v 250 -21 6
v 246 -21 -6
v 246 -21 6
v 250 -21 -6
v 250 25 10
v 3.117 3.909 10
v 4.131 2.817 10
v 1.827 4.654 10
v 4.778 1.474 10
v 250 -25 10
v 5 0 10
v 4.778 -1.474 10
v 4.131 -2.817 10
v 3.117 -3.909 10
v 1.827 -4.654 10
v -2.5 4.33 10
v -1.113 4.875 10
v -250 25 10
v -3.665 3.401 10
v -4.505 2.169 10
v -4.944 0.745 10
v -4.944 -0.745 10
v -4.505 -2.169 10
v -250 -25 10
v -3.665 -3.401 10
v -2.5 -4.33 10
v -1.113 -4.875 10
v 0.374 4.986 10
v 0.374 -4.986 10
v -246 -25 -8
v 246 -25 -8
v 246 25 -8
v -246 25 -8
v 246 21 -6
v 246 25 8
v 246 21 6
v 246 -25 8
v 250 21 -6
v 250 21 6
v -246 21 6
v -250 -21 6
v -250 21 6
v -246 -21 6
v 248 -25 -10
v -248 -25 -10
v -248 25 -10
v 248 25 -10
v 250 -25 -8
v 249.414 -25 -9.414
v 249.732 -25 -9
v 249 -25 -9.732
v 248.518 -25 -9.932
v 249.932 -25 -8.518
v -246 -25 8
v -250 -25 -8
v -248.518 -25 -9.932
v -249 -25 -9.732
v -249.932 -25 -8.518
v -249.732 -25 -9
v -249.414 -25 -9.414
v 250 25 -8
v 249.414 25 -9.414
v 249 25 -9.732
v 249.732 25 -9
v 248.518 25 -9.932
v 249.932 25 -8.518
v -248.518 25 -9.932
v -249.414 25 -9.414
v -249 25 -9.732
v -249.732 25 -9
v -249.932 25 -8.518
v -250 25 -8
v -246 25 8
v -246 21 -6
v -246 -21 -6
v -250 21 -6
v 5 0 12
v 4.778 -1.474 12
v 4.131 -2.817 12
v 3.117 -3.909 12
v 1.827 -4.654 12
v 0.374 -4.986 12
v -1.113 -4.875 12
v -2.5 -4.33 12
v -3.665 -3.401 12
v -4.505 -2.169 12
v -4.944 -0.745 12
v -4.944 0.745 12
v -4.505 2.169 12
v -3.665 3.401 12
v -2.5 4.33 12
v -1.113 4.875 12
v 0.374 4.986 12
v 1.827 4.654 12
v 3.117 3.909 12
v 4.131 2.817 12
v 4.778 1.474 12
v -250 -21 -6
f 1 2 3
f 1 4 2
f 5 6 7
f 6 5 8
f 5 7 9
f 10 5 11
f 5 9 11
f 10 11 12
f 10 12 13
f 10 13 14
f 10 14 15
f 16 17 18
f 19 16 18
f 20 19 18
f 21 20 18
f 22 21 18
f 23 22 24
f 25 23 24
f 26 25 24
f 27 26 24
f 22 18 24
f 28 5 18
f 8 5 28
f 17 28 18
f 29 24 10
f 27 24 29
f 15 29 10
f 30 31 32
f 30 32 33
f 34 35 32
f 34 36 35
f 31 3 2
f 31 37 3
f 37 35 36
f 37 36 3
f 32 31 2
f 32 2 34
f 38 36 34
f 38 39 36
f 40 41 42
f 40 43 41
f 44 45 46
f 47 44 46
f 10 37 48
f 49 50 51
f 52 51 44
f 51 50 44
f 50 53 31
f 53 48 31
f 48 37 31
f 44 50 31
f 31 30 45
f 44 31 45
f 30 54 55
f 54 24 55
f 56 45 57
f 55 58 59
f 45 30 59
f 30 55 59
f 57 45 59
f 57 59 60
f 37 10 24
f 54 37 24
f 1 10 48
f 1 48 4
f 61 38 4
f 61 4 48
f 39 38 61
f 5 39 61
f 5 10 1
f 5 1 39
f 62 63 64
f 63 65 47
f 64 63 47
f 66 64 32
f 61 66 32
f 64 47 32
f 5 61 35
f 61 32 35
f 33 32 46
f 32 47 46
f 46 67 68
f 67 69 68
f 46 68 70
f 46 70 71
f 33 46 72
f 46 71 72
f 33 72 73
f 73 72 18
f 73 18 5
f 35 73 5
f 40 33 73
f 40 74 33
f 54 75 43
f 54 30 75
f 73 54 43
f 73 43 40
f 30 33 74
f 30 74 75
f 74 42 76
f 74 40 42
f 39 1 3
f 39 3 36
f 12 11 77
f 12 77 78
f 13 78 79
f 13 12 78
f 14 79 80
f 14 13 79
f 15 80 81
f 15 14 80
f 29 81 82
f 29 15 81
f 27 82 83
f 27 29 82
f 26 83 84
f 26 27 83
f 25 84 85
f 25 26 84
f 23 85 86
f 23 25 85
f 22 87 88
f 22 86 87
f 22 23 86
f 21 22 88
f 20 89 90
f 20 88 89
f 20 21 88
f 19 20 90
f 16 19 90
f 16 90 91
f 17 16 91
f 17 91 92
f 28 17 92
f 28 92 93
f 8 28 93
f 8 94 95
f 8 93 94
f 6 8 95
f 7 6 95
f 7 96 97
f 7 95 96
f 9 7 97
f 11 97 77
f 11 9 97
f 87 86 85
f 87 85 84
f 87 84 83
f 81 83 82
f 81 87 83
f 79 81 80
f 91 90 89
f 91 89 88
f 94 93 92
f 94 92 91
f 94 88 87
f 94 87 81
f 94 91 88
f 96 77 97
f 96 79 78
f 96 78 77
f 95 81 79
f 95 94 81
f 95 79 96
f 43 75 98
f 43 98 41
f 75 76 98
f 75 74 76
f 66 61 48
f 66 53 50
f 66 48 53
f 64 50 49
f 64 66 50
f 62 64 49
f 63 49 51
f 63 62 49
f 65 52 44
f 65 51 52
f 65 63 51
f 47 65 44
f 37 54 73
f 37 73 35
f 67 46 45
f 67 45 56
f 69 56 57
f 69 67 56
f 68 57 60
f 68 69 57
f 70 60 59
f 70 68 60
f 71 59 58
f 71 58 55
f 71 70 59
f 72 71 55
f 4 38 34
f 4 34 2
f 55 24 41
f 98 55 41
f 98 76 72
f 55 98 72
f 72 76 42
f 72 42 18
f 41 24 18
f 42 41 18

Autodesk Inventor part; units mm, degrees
ref_plane "YZ Plane" through (0, 0, 0) normal (1, 0, 0) x (0, 1, 0)
ref_plane "XZ Plane" through (0, 0, 0) normal (0, 1, 0) x (-1, 0, 0)
ref_plane "XY Plane" through (0, 0, 0) normal (0, 0, 1) x (1, 0, 0)
sketch "スケッチ2" plane through (0, 0, 0) normal (1, 0, 0) x (0, 1, 0)
  line L0 (25, 10) -> (-25, 10)
  line L1 (-25, 10) -> (-25, -10)
  line L2 (-25, -10) -> (25, -10)
  line L3 (25, -10) -> (25, 10)
  line L4 (25, 10) -> (-25, -10) construction
  line L5 (-25, 10) -> (25, -10) construction
  point P0 (0, 0)
  dimension "d4" = 50
  dimension "d5" = 20
extrude "押し出し2" add sketch "スケッチ2" along normal mid plane 500
sketch "スケッチ3" plane through (-250, -25, 10) normal (0, 0, 1) x (1, 0, 0)
  circle A0 centre (250, 25) radius 5
  dimension "d8" = 10
extrude "押し出し3" add sketch "スケッチ3" along normal blind 2
fillet "フィレット1" radius 2 2 edges at (250, 0, -10) (-250, 0, -10)
sketch "スケッチ4" plane through (250, 0, 0) normal (1, 0, 0) x (0, 0, -1)
  line L0 (-6, 21) -> (6, 21)
  line L1 (6, 21) -> (6, -21)
  line L2 (6, -21) -> (-6, -21)
  line L3 (-6, -21) -> (-6, 21)
  line L4 (-6, 21) -> (6, -21) construction
  line L5 (6, 21) -> (-6, -21) construction
  point P0 (0, 0)
  dimension "d12" = 12
  dimension "d13" = 42
extrude "押し出し4" cut sketch "スケッチ4" against normal through all
sketch "スケッチ6" plane through (-250, -25, 10) normal (0, -1, 0) x (1, 0, 0)
  line L0 (4, -2) -> (496, -2)
  line L1 (496, -2) -> (496, -18)
  line L2 (496, -18) -> (4, -18)
  line L3 (4, -18) -> (4, -2)
  line L4 (4, -2) -> (496, -18) construction
  line L5 (496, -2) -> (4, -18) construction
  point P0 (250, -10)
  dimension "d16" = 492
  dimension "d17" = 16
extrude "押し出し5" cut sketch "スケッチ6" against normal through all
properties part number "hashi1shado"
